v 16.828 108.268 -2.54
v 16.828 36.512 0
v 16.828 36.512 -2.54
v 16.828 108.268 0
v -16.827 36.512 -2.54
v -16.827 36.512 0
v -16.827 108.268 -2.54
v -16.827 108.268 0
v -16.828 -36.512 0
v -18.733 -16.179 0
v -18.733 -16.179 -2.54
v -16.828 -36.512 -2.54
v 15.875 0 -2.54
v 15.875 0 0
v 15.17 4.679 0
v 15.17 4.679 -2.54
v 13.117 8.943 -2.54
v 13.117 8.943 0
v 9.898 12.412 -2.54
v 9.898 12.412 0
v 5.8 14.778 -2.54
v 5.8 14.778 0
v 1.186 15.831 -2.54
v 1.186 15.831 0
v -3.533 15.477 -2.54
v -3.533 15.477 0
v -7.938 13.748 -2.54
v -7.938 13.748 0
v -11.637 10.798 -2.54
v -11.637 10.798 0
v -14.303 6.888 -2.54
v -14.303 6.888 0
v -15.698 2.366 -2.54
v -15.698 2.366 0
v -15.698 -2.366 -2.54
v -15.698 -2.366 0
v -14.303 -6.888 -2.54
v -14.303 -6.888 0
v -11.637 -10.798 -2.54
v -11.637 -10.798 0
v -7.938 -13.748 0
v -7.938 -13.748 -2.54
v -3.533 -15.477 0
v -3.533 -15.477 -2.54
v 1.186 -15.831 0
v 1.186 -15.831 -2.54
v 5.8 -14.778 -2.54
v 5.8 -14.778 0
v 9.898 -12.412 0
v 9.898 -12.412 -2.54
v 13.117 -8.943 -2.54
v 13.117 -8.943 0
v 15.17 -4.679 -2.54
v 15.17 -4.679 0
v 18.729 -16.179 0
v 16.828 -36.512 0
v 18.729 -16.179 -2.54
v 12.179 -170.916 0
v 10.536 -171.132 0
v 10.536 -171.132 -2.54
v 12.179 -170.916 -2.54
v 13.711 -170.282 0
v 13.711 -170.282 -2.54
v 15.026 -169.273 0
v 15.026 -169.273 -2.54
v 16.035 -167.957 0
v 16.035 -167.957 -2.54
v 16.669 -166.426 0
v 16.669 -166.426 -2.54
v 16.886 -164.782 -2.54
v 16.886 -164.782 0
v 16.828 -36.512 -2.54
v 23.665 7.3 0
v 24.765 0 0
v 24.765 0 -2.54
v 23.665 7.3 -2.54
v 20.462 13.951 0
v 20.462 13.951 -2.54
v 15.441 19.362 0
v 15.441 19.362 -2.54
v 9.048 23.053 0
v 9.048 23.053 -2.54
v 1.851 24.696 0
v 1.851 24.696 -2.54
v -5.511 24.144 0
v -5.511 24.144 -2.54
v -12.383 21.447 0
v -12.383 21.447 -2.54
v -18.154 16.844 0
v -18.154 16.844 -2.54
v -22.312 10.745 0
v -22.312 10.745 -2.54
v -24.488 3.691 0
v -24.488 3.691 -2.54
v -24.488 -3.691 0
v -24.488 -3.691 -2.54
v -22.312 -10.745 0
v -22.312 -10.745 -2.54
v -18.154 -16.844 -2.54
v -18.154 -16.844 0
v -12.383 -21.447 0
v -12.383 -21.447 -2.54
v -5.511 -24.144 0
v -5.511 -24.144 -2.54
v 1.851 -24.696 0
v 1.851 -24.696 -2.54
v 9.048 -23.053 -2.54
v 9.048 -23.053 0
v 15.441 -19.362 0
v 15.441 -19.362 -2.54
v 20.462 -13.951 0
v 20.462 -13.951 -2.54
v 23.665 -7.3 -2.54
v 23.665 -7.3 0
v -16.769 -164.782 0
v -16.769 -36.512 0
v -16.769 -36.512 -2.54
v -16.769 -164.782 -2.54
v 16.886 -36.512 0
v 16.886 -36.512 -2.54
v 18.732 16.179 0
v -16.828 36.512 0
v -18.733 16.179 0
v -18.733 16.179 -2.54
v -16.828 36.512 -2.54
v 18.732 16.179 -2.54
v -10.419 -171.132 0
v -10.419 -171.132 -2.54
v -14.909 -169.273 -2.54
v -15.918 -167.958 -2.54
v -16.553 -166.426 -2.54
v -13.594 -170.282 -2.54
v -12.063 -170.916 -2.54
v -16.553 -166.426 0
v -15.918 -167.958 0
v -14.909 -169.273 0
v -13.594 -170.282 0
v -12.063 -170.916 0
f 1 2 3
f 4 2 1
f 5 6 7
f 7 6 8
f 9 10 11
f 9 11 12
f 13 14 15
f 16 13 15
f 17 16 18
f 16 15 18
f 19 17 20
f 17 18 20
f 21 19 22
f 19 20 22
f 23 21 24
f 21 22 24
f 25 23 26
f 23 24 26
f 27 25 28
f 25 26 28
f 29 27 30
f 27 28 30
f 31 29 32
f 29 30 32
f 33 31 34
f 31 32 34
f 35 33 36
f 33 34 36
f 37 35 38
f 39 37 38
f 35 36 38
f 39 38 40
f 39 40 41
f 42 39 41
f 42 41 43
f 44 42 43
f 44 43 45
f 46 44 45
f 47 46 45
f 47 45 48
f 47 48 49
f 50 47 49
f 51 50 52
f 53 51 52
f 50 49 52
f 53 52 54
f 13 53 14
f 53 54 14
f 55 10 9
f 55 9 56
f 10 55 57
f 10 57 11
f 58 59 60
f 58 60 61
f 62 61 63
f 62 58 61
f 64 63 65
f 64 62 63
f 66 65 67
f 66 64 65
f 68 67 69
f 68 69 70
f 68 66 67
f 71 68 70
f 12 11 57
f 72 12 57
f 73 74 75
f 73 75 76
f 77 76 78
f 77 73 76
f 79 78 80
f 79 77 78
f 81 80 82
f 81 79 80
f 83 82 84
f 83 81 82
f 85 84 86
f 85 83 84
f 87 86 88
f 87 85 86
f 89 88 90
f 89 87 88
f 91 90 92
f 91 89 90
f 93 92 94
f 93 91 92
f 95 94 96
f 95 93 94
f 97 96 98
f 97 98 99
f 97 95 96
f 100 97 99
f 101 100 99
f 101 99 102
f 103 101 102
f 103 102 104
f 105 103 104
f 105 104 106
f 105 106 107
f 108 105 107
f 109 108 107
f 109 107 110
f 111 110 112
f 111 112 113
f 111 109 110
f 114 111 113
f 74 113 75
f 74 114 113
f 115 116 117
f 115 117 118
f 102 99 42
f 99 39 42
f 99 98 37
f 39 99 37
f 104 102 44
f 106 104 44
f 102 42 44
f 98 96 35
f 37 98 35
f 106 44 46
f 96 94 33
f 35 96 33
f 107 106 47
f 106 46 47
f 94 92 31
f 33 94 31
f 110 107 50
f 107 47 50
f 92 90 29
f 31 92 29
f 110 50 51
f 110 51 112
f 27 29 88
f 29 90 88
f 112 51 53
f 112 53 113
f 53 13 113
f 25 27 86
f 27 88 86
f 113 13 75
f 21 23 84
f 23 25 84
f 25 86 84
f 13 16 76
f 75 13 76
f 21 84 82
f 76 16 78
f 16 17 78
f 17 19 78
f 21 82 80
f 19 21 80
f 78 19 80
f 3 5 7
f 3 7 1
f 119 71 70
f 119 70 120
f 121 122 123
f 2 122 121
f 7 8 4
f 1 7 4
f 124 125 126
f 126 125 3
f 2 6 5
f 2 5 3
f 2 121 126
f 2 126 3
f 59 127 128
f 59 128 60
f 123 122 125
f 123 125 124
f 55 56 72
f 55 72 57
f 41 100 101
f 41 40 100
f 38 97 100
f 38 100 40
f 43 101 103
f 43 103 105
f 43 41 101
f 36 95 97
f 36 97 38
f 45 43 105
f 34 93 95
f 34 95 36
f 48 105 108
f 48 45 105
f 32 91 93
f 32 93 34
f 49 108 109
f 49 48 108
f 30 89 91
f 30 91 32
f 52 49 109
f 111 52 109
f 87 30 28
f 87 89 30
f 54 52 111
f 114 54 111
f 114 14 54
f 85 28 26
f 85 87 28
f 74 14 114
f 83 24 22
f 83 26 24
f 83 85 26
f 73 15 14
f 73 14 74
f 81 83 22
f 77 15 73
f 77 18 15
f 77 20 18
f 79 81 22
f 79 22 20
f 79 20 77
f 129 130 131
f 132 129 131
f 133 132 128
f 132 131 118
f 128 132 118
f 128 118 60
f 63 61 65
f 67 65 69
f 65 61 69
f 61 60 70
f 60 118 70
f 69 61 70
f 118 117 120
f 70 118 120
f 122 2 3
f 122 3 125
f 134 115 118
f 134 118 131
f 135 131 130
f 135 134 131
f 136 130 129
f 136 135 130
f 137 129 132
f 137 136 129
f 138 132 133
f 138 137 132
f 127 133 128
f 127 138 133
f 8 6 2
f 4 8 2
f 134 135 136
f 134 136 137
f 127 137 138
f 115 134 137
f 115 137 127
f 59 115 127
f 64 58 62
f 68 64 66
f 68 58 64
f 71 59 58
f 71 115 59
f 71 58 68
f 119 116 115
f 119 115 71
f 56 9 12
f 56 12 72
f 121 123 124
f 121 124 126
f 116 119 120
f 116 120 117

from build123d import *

# Parameters (mm, degrees)
F0_R     = 24.765
F0_R_2   = 15.875
F6_DEPTH = 2.54
F5_W     = 33.655
F5_H     = 71.755


with BuildPart() as f6:
    # F0 (on Top) → F6 (new body)
    with BuildSketch(Plane.XY):
        Circle(F0_R)
        Circle(F0_R_2, mode=Mode.SUBTRACT)
    extrude(amount=-F6_DEPTH)


with BuildPart() as f6b:
    # F3 (on Top) → F6, piece 2 (new body)
    with BuildSketch(Plane.XY):
        Polygon((18.7294483185, -16.1790549755), (-18.7325756997, -16.1790549755), (-16.8275, -36.5125), (16.8275, -36.5125), align=None)
    extrude(amount=-F6_DEPTH)


with BuildPart() as f6c:
    # F3 (on Top) → F6, piece 3 (new body)
    with BuildSketch(Plane.XY):
        Polygon((-16.8275, 36.5125), (-18.7325756997, 16.1791536957), (18.7324658036, 16.1791332066), (16.8275, 36.5125), align=None)
    extrude(amount=-F6_DEPTH)


with BuildPart() as f6d:
    # F4 (on Top) → F6, piece 4 (new body)
    with BuildSketch(Plane.XY):
        with BuildLine():
            Line((16.8858534533, -36.5125), (-16.7691465467, -36.5125))
            Line((-16.7691465467, -36.5125), (-16.7691465467, -164.7825))
            ThreePointArc((-16.7691465467, -164.7825), (-14.9092746073, -169.2726280605), (-10.4191465467, -171.1325))
            Line((-10.4191465467, -171.1325), (10.5358534533, -171.1325))
            ThreePointArc((10.5358534533, -171.1325), (15.0259815138, -169.2726280605), (16.8858534533, -164.7825))
            Line((16.8858534533, -164.7825), (16.8858534533, -36.5125))
        make_face()
    extrude(amount=-F6_DEPTH)


with BuildPart() as f6e:
    # F5 (on Top) → F6, piece 5 (new body)
    with BuildSketch(Plane.XY):
        with Locations((0.0001290286, 72.39)):
            Rectangle(F5_W, F5_H)
    extrude(amount=-F6_DEPTH)


solid = Compound([f6.part, f6b.part, f6c.part, f6d.part, f6e.part])
